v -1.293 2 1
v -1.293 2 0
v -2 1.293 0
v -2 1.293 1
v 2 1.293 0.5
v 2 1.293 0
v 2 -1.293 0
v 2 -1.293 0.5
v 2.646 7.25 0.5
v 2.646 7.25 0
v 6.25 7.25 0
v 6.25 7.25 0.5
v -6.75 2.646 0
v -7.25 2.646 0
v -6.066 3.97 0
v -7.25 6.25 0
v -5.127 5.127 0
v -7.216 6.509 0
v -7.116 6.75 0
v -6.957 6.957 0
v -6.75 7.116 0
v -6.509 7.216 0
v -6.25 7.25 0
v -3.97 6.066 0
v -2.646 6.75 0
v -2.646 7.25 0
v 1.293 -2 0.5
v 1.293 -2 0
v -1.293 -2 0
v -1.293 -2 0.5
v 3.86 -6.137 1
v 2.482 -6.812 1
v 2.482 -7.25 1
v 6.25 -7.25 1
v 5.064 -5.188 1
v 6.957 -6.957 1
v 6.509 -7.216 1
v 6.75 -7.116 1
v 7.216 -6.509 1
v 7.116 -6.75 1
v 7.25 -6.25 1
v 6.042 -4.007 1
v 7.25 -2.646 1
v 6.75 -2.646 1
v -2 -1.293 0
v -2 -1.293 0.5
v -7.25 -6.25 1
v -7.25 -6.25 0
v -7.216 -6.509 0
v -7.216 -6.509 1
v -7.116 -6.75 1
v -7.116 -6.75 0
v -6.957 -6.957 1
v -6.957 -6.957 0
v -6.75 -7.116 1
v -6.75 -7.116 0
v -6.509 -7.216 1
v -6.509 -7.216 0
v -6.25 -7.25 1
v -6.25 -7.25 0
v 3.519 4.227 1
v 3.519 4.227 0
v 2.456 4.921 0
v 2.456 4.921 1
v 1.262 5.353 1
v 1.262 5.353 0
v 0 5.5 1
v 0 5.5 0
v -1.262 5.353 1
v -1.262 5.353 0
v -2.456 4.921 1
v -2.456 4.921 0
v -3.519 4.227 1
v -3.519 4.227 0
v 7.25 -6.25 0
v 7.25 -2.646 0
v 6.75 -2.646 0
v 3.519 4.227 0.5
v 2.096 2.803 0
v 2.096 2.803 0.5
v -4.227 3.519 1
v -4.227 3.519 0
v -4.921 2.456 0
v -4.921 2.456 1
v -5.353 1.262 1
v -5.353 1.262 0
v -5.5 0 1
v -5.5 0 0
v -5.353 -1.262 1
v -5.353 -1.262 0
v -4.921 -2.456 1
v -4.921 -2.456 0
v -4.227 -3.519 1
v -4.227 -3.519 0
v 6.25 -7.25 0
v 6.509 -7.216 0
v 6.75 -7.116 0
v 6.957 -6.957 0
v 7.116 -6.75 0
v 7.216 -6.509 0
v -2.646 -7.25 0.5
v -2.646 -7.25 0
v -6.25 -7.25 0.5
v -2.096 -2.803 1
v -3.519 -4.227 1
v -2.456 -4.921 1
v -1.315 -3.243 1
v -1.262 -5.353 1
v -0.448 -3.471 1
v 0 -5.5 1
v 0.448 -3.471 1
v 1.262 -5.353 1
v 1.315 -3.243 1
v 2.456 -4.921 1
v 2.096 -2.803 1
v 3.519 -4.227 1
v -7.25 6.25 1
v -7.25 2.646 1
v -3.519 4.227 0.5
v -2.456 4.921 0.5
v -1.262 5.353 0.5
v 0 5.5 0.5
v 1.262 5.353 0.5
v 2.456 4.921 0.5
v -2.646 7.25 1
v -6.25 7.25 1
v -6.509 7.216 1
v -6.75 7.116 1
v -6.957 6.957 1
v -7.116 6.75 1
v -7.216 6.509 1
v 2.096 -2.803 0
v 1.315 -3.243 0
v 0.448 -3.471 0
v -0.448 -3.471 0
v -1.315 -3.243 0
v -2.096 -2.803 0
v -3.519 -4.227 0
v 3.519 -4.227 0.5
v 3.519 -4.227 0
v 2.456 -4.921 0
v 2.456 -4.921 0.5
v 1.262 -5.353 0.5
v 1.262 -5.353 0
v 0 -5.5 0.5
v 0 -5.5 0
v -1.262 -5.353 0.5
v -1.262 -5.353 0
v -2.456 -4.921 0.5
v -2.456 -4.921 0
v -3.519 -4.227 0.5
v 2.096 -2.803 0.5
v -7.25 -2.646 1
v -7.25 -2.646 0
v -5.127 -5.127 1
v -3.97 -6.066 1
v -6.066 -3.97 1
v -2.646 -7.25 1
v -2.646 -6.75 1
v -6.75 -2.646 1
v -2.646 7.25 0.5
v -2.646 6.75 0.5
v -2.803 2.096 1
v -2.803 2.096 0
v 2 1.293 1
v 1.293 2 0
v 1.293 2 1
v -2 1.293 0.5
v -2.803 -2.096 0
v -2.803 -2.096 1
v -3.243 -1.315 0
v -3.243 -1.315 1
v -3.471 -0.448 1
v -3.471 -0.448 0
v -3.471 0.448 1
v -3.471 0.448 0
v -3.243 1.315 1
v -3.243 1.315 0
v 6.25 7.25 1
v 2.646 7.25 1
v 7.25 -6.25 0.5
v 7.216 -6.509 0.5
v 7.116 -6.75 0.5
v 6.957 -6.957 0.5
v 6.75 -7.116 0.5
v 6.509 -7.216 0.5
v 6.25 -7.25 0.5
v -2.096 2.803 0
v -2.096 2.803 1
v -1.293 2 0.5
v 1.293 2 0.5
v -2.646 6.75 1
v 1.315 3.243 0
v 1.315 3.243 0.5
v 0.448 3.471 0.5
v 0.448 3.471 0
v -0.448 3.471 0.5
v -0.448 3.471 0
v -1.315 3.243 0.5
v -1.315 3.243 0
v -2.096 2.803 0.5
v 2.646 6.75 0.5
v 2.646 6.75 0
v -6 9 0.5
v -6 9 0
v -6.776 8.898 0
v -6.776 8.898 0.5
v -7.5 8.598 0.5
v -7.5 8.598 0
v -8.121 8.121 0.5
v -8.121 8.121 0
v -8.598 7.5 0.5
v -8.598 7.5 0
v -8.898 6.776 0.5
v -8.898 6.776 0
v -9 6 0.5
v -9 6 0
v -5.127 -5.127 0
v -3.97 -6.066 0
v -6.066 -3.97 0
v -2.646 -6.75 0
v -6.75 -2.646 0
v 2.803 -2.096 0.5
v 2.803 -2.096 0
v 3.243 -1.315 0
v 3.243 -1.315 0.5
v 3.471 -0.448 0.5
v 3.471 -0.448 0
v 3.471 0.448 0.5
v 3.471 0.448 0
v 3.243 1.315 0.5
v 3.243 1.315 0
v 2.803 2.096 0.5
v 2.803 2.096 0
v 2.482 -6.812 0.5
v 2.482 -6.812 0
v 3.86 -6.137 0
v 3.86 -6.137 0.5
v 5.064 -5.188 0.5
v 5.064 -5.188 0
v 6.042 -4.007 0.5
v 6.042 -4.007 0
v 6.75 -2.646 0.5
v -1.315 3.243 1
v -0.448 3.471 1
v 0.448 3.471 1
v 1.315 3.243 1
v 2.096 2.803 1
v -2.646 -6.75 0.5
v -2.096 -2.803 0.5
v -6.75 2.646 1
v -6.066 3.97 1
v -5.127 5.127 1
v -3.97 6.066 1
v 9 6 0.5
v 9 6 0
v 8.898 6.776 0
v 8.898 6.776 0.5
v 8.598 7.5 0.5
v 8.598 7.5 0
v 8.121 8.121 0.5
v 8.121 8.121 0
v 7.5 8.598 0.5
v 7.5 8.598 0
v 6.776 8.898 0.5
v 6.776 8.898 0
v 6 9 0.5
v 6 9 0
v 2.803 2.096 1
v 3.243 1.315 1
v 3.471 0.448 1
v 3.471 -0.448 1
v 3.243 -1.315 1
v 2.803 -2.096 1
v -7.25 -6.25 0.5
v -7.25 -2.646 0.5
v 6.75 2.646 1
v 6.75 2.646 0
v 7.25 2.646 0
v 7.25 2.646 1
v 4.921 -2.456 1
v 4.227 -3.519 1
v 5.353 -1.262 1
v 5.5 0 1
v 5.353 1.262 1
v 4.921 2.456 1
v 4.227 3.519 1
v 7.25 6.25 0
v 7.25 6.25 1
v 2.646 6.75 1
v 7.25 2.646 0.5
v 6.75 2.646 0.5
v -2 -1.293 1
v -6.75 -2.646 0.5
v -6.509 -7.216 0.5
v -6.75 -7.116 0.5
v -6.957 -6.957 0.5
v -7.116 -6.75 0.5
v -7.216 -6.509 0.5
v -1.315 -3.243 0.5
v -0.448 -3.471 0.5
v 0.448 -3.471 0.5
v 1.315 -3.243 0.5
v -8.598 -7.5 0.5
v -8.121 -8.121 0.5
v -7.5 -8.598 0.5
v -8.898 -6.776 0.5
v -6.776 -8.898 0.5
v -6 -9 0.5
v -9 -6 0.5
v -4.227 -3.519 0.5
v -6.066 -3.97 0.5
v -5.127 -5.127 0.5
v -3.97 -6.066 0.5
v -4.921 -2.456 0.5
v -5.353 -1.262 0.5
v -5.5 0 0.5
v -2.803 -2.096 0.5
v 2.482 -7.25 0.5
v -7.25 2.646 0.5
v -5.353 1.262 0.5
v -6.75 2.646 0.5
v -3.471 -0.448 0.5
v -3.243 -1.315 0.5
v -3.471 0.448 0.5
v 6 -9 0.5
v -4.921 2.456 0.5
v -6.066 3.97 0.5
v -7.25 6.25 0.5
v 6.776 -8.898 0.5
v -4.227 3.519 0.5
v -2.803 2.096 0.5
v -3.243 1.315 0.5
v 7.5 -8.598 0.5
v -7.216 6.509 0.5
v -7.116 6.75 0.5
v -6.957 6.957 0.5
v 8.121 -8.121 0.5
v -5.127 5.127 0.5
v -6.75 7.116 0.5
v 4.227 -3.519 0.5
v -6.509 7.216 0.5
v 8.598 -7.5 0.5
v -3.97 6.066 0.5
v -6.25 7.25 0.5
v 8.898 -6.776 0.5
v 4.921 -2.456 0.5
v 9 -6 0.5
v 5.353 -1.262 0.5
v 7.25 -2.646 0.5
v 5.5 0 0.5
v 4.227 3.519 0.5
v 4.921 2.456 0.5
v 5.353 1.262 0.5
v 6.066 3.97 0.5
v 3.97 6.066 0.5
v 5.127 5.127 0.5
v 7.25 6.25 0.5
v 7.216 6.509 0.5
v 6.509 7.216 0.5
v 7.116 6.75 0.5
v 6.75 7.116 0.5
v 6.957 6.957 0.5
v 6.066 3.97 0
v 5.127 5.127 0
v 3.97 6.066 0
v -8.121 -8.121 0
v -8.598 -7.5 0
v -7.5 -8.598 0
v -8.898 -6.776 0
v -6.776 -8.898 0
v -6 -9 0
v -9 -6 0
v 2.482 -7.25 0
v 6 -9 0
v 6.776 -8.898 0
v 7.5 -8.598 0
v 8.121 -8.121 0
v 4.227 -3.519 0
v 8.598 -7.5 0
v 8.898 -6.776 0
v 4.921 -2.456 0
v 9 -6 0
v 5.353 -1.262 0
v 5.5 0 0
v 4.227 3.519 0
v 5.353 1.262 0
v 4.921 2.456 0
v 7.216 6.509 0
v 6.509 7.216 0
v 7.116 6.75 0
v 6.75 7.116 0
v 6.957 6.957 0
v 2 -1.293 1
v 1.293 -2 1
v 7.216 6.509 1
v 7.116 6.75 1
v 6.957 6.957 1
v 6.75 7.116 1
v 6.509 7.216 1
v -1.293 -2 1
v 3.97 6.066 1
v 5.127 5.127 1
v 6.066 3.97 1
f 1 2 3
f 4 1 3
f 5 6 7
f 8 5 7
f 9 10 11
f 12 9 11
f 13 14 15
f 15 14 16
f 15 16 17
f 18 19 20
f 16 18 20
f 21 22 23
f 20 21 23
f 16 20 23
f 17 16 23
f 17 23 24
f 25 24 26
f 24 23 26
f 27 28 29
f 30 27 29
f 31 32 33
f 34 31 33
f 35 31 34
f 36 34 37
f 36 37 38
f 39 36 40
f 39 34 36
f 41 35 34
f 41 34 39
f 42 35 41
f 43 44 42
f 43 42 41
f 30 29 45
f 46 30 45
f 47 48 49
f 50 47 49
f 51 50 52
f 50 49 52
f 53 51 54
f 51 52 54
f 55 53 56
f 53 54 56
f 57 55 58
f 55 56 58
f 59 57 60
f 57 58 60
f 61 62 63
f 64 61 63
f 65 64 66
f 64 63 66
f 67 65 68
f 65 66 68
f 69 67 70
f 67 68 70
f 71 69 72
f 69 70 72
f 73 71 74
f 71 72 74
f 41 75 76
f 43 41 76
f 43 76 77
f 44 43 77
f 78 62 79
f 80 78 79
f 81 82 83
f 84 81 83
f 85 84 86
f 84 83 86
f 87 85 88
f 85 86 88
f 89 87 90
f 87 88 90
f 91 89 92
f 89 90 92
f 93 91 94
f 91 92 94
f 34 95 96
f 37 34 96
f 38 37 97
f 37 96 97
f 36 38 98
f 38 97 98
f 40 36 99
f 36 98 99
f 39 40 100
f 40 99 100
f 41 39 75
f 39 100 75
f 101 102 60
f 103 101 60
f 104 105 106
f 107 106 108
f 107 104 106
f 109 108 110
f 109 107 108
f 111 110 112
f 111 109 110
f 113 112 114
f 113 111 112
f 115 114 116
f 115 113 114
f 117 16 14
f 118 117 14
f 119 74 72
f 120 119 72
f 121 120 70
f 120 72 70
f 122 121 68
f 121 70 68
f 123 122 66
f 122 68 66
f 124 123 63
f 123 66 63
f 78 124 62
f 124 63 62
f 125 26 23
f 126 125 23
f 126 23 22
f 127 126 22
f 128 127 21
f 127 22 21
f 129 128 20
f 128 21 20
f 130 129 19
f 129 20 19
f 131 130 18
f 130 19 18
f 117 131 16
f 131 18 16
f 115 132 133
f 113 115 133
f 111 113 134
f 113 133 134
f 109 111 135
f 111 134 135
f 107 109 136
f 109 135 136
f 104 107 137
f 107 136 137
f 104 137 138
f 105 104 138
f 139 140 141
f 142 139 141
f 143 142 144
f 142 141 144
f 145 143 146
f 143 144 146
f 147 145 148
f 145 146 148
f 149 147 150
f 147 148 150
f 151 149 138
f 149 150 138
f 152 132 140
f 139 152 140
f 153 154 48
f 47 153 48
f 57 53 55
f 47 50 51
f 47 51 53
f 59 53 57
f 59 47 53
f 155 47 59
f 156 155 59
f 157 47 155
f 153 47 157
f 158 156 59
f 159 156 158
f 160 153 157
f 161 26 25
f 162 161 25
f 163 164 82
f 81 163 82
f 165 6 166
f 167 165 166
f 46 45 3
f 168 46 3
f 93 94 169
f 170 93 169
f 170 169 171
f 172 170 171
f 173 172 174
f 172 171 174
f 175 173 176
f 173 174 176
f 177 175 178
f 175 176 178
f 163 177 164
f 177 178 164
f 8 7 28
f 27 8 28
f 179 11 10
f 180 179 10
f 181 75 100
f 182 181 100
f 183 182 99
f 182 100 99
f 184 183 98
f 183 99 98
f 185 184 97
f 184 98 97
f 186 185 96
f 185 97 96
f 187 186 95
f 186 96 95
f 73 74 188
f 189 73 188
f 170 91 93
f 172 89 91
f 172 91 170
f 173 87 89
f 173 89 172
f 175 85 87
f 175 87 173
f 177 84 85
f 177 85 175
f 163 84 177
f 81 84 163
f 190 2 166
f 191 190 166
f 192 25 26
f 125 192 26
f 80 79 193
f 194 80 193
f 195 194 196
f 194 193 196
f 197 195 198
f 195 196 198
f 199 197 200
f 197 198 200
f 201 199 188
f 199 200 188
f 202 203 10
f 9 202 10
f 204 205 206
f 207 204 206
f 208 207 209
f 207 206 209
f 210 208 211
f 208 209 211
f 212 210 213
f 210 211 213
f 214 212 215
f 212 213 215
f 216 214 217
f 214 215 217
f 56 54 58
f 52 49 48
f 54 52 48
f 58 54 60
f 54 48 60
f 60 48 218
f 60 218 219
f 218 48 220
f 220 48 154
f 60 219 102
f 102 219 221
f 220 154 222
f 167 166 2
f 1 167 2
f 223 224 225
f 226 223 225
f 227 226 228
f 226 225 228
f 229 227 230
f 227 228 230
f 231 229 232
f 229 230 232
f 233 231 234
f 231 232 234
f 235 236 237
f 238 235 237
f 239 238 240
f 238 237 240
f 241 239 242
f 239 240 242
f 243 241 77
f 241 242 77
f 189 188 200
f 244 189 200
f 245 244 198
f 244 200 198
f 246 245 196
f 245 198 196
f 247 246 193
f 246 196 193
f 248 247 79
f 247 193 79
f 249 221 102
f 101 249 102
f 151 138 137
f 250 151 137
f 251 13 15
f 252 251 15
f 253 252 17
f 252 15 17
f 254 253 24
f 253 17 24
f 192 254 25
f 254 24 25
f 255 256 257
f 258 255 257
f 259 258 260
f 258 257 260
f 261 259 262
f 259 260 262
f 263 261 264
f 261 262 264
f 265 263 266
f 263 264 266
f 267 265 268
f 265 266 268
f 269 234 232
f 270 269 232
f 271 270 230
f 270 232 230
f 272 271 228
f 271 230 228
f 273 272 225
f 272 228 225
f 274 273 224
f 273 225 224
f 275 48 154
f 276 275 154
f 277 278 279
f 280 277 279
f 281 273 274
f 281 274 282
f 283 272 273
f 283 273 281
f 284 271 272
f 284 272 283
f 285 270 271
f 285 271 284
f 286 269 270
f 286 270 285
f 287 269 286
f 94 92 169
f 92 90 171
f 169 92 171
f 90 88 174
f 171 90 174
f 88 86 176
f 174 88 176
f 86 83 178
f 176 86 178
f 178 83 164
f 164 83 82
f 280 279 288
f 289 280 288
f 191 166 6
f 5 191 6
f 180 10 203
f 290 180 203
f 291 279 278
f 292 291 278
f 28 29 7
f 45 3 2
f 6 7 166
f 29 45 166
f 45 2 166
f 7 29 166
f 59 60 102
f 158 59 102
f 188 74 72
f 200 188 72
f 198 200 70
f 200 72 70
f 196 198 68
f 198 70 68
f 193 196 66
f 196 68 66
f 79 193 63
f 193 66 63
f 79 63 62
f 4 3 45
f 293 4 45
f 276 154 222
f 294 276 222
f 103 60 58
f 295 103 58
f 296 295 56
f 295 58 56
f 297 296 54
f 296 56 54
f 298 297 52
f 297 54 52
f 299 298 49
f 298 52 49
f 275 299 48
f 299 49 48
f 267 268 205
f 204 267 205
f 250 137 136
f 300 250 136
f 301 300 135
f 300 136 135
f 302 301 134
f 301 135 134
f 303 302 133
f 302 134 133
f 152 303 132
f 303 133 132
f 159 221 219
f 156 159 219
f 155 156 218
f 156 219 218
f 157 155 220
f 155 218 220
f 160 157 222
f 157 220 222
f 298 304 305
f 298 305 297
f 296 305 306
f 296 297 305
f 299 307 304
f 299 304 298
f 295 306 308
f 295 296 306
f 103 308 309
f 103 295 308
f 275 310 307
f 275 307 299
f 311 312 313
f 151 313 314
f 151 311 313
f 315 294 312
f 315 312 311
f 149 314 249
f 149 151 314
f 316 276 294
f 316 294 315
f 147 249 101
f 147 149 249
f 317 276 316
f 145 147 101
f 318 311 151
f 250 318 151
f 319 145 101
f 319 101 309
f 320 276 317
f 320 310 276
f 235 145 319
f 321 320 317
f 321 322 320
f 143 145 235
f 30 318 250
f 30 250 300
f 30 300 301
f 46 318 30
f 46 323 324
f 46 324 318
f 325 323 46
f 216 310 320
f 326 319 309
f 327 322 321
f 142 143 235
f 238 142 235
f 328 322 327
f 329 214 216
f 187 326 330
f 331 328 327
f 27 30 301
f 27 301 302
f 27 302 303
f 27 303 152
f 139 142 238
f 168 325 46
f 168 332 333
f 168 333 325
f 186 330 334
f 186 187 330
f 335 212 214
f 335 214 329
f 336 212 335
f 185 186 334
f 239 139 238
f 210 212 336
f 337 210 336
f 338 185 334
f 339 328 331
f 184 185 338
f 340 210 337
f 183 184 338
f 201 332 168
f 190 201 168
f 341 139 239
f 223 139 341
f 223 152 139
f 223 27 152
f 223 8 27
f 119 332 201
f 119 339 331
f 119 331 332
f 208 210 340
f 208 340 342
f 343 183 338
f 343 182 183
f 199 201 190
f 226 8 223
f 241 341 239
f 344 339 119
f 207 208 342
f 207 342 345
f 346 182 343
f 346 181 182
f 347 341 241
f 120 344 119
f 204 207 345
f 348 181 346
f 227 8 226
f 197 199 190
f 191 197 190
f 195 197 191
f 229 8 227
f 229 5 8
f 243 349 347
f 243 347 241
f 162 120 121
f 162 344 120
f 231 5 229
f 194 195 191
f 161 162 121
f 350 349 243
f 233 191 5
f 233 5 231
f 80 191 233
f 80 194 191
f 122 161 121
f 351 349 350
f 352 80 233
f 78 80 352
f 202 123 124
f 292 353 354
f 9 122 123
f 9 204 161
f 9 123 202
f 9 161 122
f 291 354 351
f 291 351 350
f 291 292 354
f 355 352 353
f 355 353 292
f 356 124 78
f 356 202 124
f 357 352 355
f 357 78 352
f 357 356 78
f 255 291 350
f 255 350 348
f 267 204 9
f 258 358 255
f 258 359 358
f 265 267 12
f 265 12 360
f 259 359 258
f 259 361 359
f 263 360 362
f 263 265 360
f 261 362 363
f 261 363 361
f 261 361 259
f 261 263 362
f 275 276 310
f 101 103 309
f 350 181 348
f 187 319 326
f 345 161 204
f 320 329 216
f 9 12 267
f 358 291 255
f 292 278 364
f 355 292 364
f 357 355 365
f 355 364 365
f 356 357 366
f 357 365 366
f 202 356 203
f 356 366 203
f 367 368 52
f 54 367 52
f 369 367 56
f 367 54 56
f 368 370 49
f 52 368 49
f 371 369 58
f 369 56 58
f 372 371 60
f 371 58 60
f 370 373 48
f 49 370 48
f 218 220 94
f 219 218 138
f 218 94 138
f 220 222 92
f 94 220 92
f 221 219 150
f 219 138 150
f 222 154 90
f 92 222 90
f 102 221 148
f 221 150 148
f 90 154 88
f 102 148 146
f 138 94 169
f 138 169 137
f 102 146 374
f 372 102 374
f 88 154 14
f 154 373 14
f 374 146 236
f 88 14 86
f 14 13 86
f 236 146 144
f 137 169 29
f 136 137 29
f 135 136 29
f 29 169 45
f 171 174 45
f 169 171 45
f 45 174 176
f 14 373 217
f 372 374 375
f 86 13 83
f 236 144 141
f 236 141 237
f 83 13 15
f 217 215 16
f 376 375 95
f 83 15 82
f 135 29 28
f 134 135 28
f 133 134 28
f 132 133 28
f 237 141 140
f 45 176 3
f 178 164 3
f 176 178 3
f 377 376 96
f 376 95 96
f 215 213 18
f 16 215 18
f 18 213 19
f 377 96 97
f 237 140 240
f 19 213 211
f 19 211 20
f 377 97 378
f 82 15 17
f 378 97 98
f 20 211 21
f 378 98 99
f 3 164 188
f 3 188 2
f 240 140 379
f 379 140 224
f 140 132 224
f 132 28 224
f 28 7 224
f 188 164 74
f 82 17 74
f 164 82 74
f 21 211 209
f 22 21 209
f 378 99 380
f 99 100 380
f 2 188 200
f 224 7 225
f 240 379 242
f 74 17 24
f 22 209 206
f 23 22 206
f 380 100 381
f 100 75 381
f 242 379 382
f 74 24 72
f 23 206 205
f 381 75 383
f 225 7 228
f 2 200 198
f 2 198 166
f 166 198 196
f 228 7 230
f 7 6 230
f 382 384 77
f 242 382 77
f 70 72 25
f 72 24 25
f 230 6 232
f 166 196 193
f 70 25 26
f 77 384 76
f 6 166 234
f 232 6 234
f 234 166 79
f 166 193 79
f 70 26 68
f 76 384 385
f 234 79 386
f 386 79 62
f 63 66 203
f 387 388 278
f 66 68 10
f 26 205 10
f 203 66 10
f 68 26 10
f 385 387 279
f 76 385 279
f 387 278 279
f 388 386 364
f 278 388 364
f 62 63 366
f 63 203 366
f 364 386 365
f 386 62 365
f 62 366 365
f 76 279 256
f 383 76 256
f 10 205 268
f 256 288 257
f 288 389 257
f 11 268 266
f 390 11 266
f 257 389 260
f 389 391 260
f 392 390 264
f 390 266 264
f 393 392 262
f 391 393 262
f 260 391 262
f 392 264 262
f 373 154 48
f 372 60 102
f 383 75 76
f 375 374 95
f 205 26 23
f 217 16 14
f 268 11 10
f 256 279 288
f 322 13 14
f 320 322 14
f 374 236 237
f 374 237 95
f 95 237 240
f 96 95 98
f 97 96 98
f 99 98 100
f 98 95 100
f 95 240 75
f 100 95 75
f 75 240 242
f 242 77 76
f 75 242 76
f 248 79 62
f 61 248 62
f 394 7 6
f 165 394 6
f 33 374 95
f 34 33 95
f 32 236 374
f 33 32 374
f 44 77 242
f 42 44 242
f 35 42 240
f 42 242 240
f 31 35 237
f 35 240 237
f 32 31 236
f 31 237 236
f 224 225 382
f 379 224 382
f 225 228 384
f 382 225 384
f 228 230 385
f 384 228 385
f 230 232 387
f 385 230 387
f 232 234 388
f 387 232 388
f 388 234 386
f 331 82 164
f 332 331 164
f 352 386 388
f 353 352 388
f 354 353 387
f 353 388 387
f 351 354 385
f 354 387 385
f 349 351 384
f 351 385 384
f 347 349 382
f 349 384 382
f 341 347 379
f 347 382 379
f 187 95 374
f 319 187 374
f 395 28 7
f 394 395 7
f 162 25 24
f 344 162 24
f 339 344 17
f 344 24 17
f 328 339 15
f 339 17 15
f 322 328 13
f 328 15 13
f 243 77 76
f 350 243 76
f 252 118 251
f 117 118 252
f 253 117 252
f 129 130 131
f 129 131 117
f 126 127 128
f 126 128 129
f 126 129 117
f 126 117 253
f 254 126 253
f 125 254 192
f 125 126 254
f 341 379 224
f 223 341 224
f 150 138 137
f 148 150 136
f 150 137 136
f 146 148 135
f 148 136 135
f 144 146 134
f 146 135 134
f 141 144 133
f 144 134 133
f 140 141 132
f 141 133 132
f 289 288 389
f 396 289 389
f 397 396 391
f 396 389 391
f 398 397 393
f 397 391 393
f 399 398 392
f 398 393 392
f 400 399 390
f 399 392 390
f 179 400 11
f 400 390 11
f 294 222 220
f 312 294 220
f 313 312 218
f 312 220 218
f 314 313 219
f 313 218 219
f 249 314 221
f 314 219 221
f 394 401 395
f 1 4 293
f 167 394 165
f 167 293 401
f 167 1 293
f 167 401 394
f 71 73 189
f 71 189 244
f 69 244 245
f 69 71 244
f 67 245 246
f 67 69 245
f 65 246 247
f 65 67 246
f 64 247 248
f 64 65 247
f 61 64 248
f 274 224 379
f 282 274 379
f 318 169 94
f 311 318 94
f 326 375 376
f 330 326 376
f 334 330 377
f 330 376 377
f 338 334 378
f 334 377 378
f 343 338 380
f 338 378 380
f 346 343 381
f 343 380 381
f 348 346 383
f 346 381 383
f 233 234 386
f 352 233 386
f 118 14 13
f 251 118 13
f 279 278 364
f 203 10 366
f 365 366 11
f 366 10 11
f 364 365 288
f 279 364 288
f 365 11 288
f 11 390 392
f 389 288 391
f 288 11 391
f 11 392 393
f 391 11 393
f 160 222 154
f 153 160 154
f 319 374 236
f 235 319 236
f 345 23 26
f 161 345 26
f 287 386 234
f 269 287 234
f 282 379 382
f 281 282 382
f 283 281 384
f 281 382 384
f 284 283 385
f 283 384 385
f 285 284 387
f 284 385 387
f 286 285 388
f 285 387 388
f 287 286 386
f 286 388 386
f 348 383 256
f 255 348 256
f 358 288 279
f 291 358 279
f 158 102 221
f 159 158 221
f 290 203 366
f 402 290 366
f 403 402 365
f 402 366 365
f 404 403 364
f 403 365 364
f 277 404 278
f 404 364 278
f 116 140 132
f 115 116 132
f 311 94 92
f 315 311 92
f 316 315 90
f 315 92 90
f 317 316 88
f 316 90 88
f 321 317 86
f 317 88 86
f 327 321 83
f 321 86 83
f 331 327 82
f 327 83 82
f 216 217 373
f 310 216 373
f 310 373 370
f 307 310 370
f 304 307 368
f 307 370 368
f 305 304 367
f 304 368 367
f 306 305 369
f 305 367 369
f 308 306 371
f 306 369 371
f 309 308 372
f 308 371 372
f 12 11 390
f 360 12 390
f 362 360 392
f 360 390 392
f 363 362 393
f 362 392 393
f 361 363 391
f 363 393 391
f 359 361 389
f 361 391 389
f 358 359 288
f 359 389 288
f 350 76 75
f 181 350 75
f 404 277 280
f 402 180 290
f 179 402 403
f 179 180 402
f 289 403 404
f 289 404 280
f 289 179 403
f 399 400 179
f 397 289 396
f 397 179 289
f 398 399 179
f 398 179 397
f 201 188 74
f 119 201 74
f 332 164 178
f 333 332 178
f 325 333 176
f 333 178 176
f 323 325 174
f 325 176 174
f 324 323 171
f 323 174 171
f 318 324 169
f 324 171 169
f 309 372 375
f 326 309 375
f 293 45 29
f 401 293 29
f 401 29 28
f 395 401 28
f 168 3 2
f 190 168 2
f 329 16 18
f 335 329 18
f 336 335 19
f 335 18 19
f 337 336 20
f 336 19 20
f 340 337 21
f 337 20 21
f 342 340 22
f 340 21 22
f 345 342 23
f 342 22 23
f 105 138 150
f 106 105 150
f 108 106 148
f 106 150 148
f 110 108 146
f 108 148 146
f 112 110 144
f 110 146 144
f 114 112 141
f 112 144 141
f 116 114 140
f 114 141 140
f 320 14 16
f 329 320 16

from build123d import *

# Parameters (mm, degrees)
F1_DEPTH = 1
F2_DEPTH = 0.5


with BuildPart() as f1:
    # F0 (on Top) → F1 (new body)
    with BuildSketch(Plane.XY):
        with BuildLine():
            Line((-2.645751, 6.75), (-2.645751, 7.25))
            Line((-2.645751, 7.25), (-6.25, 7.25))
            ThreePointArc((-6.25, 7.25), (-6.957107, 6.957107), (-7.25, 6.25))
            Line((-7.25, 6.25), (-7.25, 2.645751))
            Line((-7.25, 2.645751), (-6.75, 2.645751))
            ThreePointArc((-6.75, 2.645751), (-5.126524, 5.126524), (-2.645751, 6.75))
        make_face()
        with BuildLine():
            ThreePointArc((7.25, 6.25), (6.957107, 6.957107), (6.25, 7.25))
            Line((6.25, 7.25), (2.645751, 7.25))
            Line((2.645751, 7.25), (2.645751, 6.75))
            ThreePointArc((2.645751, 6.75), (5.126524, 5.126524), (6.75, 2.645751))
            Line((6.75, 2.645751), (7.25, 2.645751))
            Line((7.25, 2.645751), (7.25, 6.25))
        make_face()
        with BuildLine():
            Line((2.48227, -7.25), (6.25, -7.25))
            ThreePointArc((6.25, -7.25), (6.957107, -6.957107), (7.25, -6.25))
            Line((7.25, -6.25), (7.25, -2.645751))
            Line((7.25, -2.645751), (6.75, -2.645751))
            ThreePointArc((6.75, -2.645751), (5.064358, -5.187945), (2.48227, -6.811816))
            Line((2.48227, -6.811816), (2.48227, -7.25))
        make_face()
        with BuildLine():
            ThreePointArc((-2.645751, -6.75), (-5.126524, -5.126524), (-6.75, -2.645751))
            Line((-6.75, -2.645751), (-7.25, -2.645751))
            Line((-7.25, -2.645751), (-7.25, -6.25))
            ThreePointArc((-7.25, -6.25), (-6.957107, -6.957107), (-6.25, -7.25))
            Line((-6.25, -7.25), (-2.645751, -7.25))
            Line((-2.645751, -7.25), (-2.645751, -6.75))
        make_face()
        with BuildLine():
            ThreePointArc((-2.803043, -2.095936), (-3.5, 0), (-2.803043, 2.095936))
            Line((-2.803043, 2.095936), (-4.226537, 3.51943))
            ThreePointArc((-4.226537, 3.51943), (-5.5, 0), (-4.226537, -3.51943))
            Line((-4.226537, -3.51943), (-2.803043, -2.095936))
        make_face()
        with BuildLine():
            Line((-3.51943, 4.226537), (-2.095936, 2.803043))
            ThreePointArc((-2.095936, 2.803043), (0, 3.5), (2.095936, 2.803043))
            Line((2.095936, 2.803043), (3.51943, 4.226537))
            ThreePointArc((3.51943, 4.226537), (0, 5.5), (-3.51943, 4.226537))
        make_face()
        with BuildLine():
            Line((4.226537, 3.51943), (2.803043, 2.095936))
            ThreePointArc((2.803043, 2.095936), (3.5, 0), (2.803043, -2.095936))
            Line((2.803043, -2.095936), (4.226537, -3.51943))
            ThreePointArc((4.226537, -3.51943), (5.5, 0), (4.226537, 3.51943))
        make_face()
        with BuildLine():
            Line((-2.095936, -2.803043), (-3.51943, -4.226537))
            ThreePointArc((-3.51943, -4.226537), (0, -5.5), (3.51943, -4.226537))
            Line((3.51943, -4.226537), (2.095936, -2.803043))
            ThreePointArc((2.095936, -2.803043), (0, -3.5), (-2.095936, -2.803043))
        make_face()
        Polygon((-1.292893, -2), (1.292893, -2), (2, -1.292893), (2, 1.292893), (1.292893, 2), (-1.292893, 2), (-2, 1.292893), (-2, -1.292893), align=None)
    extrude(amount=F1_DEPTH)


with BuildPart() as f2:
    # F0 (on Top) → F2 (new body)
    with BuildSketch(Plane.XY):
        with BuildLine():
            Line((-6, -9), (6, -9))
            ThreePointArc((6, -9), (8.12132, -8.12132), (9, -6))
            Line((9, -6), (9, 6))
            ThreePointArc((9, 6), (8.12132, 8.12132), (6, 9))
            Line((6, 9), (-6, 9))
            ThreePointArc((-6, 9), (-8.12132, 8.12132), (-9, 6))
            Line((-9, 6), (-9, -6))
            ThreePointArc((-9, -6), (-8.12132, -8.12132), (-6, -9))
        make_face()
        with BuildLine():
            Line((-7.25, -2.645751), (-6.75, -2.645751))
            ThreePointArc((-6.75, -2.645751), (-5.126524, -5.126524), (-2.645751, -6.75))
            Line((-2.645751, -6.75), (-2.645751, -7.25))
            Line((-2.645751, -7.25), (-6.25, -7.25))
            ThreePointArc((-6.25, -7.25), (-6.957107, -6.957107), (-7.25, -6.25))
            Line((-7.25, -6.25), (-7.25, -2.645751))
        make_face(mode=Mode.SUBTRACT)
        with BuildLine():
            ThreePointArc((7.25, -6.25), (6.957107, -6.957107), (6.25, -7.25))
            Line((6.25, -7.25), (2.48227, -7.25))
            Line((2.48227, -7.25), (2.48227, -6.811816))
            ThreePointArc((2.48227, -6.811816), (5.064358, -5.187945), (6.75, -2.645751))
            Line((6.75, -2.645751), (7.25, -2.645751))
            Line((7.25, -2.645751), (7.25, -6.25))
        make_face(mode=Mode.SUBTRACT)
        with BuildLine():
            ThreePointArc((3.51943, -4.226537), (0, -5.5), (-3.51943, -4.226537))
            Line((-3.51943, -4.226537), (-2.095936, -2.803043))
            ThreePointArc((-2.095936, -2.803043), (0, -3.5), (2.095936, -2.803043))
            Line((2.095936, -2.803043), (3.51943, -4.226537))
        make_face(mode=Mode.SUBTRACT)
        with BuildLine():
            Line((-4.226537, 3.51943), (-2.803043, 2.095936))
            ThreePointArc((-2.803043, 2.095936), (-3.5, 0), (-2.803043, -2.095936))
            Line((-2.803043, -2.095936), (-4.226537, -3.51943))
            ThreePointArc((-4.226537, -3.51943), (-5.5, 0), (-4.226537, 3.51943))
        make_face(mode=Mode.SUBTRACT)
        with BuildLine():
            Line((-6.25, 7.25), (-2.645751, 7.25))
            Line((-2.645751, 7.25), (-2.645751, 6.75))
            ThreePointArc((-2.645751, 6.75), (-5.126524, 5.126524), (-6.75, 2.645751))
            Line((-6.75, 2.645751), (-7.25, 2.645751))
            Line((-7.25, 2.645751), (-7.25, 6.25))
            ThreePointArc((-7.25, 6.25), (-6.957107, 6.957107), (-6.25, 7.25))
        make_face(mode=Mode.SUBTRACT)
        Polygon((2, -1.292893), (1.292893, -2), (-1.292893, -2), (-2, -1.292893), (-2, 1.292893), (-1.292893, 2), (1.292893, 2), (2, 1.292893), align=None, mode=Mode.SUBTRACT)
        with BuildLine():
            ThreePointArc((2.803043, -2.095936), (3.5, 0), (2.803043, 2.095936))
            Line((2.803043, 2.095936), (4.226537, 3.51943))
            ThreePointArc((4.226537, 3.51943), (5.5, 0), (4.226537, -3.51943))
            Line((4.226537, -3.51943), (2.803043, -2.095936))
        make_face(mode=Mode.SUBTRACT)
        with BuildLine():
            ThreePointArc((2.095936, 2.803043), (0, 3.5), (-2.095936, 2.803043))
            Line((-2.095936, 2.803043), (-3.51943, 4.226537))
            ThreePointArc((-3.51943, 4.226537), (0, 5.5), (3.51943, 4.226537))
            Line((3.51943, 4.226537), (2.095936, 2.803043))
        make_face(mode=Mode.SUBTRACT)
        with BuildLine():
            Line((2.645751, 7.25), (6.25, 7.25))
            ThreePointArc((6.25, 7.25), (6.957107, 6.957107), (7.25, 6.25))
            Line((7.25, 6.25), (7.25, 2.645751))
            Line((7.25, 2.645751), (6.75, 2.645751))
            ThreePointArc((6.75, 2.645751), (5.126524, 5.126524), (2.645751, 6.75))
            Line((2.645751, 6.75), (2.645751, 7.25))
        make_face(mode=Mode.SUBTRACT)
    extrude(amount=F2_DEPTH)


solid = Compound([f1.part, f2.part])
